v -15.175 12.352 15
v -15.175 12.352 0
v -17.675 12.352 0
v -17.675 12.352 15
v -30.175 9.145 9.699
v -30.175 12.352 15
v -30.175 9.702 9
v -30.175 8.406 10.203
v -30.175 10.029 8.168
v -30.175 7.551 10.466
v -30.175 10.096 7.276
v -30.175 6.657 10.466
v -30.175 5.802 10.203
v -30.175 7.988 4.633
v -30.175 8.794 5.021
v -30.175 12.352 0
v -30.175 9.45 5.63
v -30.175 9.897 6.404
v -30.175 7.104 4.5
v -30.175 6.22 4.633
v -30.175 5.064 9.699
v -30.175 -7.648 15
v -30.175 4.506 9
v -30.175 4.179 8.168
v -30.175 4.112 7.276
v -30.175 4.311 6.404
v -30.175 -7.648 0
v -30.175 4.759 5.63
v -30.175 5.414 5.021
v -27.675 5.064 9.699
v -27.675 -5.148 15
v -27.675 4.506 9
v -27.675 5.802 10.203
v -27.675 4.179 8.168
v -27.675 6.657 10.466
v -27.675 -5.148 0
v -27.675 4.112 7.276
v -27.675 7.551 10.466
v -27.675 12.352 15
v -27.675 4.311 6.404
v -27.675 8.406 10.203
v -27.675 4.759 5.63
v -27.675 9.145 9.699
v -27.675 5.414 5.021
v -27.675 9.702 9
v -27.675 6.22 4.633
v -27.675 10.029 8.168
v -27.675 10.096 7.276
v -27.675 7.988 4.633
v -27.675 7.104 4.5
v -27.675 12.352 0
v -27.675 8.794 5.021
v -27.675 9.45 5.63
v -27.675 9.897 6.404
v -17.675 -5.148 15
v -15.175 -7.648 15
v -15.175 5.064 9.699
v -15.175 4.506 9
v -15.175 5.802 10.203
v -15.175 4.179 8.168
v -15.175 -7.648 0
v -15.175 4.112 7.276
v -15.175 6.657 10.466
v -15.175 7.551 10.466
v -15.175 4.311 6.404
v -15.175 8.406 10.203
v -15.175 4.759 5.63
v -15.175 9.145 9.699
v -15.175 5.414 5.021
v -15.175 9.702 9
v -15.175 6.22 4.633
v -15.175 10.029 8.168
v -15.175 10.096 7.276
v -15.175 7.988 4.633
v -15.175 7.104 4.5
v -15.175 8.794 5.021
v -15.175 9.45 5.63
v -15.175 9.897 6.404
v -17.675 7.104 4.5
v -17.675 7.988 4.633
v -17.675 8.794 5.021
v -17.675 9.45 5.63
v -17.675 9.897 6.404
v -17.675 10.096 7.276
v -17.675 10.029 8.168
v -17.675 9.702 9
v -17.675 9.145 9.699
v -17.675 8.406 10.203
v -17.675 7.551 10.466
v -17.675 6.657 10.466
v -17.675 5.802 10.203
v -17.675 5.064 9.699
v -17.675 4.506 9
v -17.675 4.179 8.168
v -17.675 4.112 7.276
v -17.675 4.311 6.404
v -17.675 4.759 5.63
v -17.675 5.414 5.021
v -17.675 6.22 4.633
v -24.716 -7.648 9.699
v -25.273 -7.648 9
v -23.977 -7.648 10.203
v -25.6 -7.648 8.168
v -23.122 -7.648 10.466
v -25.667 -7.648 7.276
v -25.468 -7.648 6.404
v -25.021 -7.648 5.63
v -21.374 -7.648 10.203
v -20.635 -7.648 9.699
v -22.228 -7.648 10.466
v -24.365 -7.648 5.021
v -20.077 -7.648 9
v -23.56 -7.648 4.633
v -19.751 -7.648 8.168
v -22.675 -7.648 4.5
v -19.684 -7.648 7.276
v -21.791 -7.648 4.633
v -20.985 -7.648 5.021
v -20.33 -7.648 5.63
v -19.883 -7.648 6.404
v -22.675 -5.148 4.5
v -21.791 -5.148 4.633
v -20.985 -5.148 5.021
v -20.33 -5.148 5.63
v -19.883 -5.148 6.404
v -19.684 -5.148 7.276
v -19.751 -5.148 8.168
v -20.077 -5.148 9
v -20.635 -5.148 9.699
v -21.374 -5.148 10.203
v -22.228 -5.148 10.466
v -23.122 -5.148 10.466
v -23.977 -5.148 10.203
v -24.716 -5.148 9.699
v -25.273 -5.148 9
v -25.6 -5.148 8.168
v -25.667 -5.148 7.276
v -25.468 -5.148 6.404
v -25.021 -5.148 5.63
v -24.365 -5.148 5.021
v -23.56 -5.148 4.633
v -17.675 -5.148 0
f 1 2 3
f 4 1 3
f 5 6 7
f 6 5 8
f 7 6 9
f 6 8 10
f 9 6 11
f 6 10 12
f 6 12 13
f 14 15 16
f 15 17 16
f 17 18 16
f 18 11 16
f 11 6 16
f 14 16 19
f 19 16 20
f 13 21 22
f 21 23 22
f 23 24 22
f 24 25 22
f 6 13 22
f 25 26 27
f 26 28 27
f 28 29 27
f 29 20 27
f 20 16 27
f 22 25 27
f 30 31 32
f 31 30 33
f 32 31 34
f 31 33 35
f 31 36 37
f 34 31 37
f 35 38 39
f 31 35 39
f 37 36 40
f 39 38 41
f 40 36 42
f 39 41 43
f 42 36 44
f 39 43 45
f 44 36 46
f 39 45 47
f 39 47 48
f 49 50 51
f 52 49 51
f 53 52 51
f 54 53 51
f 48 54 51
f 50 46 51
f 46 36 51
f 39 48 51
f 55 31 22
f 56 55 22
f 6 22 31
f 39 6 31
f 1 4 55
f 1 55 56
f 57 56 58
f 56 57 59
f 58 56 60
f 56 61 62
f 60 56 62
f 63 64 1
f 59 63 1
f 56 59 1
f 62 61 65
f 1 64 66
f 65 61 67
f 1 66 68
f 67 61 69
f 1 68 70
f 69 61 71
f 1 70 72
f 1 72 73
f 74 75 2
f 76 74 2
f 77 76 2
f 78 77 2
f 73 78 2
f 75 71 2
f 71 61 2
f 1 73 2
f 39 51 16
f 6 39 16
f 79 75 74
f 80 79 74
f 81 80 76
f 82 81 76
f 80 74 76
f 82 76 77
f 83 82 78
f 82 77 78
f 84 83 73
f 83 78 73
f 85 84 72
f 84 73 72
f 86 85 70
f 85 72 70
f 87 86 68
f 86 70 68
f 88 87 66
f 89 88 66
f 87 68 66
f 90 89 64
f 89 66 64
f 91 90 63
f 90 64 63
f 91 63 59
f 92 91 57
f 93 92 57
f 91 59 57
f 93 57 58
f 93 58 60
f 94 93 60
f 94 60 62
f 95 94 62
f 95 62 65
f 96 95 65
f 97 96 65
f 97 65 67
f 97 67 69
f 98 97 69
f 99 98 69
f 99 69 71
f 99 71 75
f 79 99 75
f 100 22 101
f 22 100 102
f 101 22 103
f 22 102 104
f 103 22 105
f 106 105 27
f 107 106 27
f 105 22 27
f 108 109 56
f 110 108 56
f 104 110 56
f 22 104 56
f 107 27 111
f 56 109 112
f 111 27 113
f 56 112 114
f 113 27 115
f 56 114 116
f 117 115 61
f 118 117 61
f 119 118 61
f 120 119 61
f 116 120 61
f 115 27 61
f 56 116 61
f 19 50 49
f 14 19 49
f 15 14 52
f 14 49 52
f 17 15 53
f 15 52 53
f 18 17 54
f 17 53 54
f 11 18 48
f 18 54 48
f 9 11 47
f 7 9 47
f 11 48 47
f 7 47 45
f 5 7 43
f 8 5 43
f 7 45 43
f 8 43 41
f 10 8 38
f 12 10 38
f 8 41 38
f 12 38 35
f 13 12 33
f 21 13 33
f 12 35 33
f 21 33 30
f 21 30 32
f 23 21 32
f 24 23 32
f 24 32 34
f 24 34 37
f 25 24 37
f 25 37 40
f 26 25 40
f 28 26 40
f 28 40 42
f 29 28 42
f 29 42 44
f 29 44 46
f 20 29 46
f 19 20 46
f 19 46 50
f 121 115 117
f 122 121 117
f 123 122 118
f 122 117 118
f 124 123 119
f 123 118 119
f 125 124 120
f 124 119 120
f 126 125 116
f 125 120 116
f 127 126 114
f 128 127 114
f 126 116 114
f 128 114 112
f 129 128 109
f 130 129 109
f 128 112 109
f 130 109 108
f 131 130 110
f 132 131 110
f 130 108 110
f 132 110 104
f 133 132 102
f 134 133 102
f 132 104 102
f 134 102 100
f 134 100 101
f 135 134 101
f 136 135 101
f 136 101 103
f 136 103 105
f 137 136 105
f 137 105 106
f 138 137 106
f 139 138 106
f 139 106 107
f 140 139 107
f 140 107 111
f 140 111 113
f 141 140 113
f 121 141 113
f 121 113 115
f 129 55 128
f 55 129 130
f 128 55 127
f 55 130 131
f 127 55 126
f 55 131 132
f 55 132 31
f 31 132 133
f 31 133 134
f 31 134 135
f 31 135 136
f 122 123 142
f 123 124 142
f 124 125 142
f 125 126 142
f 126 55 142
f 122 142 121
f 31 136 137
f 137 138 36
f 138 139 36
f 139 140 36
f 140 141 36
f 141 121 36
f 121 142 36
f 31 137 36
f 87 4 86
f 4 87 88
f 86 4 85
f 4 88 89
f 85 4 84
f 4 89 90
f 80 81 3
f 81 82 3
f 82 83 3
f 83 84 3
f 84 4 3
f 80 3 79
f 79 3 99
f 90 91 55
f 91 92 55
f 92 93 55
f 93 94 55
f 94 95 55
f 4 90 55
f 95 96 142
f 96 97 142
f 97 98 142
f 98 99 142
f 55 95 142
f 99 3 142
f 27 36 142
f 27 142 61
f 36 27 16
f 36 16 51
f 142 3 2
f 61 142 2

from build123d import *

# Parameters (mm, degrees)
BOSS_EXTRUDE1_DEPTH = 15
SKETCH2_R           = 3
CUT_EXTRUDE1_DEPTH  = 17
SKETCH3_R           = 3
CUT_EXTRUDE2_DEPTH  = 17


with BuildPart() as part:
    # Sketch1 → Boss-Extrude1 (new body)
    with BuildSketch(Plane.XY):
        Polygon((-30.175322727, 12.351876728), (-30.175322727, -7.648123272), (-15.175322727, -7.648123272), (-15.175322727, 12.351876728), (-17.675322727, 12.351876728), (-17.675322727, -5.148123272), (-27.675322727, -5.148123272), (-27.675322727, 12.351876728), align=None)
    extrude(amount=BOSS_EXTRUDE1_DEPTH)

    # Sketch2 → Cut-Extrude1 (cut)
    with BuildSketch(Plane(origin=(-15.175322727, 0, 0), x_dir=(0, 0, -1), z_dir=(1, 0, 0))):
        with Locations((-7.5, 7.104053692)):
            Circle(SKETCH2_R)
    extrude(amount=-CUT_EXTRUDE1_DEPTH, mode=Mode.SUBTRACT)

    # Sketch3 → Cut-Extrude2 (cut)
    with BuildSketch(Plane(origin=(0, -7.648123272, 0), x_dir=(-1, 0, 0), z_dir=(0, -1, 0))):
        with Locations(Location((22.675322727, -7.5, 0), (0, 0, 90))):
            Circle(SKETCH3_R)
    extrude(amount=-CUT_EXTRUDE2_DEPTH, mode=Mode.SUBTRACT)


solid = part.part
